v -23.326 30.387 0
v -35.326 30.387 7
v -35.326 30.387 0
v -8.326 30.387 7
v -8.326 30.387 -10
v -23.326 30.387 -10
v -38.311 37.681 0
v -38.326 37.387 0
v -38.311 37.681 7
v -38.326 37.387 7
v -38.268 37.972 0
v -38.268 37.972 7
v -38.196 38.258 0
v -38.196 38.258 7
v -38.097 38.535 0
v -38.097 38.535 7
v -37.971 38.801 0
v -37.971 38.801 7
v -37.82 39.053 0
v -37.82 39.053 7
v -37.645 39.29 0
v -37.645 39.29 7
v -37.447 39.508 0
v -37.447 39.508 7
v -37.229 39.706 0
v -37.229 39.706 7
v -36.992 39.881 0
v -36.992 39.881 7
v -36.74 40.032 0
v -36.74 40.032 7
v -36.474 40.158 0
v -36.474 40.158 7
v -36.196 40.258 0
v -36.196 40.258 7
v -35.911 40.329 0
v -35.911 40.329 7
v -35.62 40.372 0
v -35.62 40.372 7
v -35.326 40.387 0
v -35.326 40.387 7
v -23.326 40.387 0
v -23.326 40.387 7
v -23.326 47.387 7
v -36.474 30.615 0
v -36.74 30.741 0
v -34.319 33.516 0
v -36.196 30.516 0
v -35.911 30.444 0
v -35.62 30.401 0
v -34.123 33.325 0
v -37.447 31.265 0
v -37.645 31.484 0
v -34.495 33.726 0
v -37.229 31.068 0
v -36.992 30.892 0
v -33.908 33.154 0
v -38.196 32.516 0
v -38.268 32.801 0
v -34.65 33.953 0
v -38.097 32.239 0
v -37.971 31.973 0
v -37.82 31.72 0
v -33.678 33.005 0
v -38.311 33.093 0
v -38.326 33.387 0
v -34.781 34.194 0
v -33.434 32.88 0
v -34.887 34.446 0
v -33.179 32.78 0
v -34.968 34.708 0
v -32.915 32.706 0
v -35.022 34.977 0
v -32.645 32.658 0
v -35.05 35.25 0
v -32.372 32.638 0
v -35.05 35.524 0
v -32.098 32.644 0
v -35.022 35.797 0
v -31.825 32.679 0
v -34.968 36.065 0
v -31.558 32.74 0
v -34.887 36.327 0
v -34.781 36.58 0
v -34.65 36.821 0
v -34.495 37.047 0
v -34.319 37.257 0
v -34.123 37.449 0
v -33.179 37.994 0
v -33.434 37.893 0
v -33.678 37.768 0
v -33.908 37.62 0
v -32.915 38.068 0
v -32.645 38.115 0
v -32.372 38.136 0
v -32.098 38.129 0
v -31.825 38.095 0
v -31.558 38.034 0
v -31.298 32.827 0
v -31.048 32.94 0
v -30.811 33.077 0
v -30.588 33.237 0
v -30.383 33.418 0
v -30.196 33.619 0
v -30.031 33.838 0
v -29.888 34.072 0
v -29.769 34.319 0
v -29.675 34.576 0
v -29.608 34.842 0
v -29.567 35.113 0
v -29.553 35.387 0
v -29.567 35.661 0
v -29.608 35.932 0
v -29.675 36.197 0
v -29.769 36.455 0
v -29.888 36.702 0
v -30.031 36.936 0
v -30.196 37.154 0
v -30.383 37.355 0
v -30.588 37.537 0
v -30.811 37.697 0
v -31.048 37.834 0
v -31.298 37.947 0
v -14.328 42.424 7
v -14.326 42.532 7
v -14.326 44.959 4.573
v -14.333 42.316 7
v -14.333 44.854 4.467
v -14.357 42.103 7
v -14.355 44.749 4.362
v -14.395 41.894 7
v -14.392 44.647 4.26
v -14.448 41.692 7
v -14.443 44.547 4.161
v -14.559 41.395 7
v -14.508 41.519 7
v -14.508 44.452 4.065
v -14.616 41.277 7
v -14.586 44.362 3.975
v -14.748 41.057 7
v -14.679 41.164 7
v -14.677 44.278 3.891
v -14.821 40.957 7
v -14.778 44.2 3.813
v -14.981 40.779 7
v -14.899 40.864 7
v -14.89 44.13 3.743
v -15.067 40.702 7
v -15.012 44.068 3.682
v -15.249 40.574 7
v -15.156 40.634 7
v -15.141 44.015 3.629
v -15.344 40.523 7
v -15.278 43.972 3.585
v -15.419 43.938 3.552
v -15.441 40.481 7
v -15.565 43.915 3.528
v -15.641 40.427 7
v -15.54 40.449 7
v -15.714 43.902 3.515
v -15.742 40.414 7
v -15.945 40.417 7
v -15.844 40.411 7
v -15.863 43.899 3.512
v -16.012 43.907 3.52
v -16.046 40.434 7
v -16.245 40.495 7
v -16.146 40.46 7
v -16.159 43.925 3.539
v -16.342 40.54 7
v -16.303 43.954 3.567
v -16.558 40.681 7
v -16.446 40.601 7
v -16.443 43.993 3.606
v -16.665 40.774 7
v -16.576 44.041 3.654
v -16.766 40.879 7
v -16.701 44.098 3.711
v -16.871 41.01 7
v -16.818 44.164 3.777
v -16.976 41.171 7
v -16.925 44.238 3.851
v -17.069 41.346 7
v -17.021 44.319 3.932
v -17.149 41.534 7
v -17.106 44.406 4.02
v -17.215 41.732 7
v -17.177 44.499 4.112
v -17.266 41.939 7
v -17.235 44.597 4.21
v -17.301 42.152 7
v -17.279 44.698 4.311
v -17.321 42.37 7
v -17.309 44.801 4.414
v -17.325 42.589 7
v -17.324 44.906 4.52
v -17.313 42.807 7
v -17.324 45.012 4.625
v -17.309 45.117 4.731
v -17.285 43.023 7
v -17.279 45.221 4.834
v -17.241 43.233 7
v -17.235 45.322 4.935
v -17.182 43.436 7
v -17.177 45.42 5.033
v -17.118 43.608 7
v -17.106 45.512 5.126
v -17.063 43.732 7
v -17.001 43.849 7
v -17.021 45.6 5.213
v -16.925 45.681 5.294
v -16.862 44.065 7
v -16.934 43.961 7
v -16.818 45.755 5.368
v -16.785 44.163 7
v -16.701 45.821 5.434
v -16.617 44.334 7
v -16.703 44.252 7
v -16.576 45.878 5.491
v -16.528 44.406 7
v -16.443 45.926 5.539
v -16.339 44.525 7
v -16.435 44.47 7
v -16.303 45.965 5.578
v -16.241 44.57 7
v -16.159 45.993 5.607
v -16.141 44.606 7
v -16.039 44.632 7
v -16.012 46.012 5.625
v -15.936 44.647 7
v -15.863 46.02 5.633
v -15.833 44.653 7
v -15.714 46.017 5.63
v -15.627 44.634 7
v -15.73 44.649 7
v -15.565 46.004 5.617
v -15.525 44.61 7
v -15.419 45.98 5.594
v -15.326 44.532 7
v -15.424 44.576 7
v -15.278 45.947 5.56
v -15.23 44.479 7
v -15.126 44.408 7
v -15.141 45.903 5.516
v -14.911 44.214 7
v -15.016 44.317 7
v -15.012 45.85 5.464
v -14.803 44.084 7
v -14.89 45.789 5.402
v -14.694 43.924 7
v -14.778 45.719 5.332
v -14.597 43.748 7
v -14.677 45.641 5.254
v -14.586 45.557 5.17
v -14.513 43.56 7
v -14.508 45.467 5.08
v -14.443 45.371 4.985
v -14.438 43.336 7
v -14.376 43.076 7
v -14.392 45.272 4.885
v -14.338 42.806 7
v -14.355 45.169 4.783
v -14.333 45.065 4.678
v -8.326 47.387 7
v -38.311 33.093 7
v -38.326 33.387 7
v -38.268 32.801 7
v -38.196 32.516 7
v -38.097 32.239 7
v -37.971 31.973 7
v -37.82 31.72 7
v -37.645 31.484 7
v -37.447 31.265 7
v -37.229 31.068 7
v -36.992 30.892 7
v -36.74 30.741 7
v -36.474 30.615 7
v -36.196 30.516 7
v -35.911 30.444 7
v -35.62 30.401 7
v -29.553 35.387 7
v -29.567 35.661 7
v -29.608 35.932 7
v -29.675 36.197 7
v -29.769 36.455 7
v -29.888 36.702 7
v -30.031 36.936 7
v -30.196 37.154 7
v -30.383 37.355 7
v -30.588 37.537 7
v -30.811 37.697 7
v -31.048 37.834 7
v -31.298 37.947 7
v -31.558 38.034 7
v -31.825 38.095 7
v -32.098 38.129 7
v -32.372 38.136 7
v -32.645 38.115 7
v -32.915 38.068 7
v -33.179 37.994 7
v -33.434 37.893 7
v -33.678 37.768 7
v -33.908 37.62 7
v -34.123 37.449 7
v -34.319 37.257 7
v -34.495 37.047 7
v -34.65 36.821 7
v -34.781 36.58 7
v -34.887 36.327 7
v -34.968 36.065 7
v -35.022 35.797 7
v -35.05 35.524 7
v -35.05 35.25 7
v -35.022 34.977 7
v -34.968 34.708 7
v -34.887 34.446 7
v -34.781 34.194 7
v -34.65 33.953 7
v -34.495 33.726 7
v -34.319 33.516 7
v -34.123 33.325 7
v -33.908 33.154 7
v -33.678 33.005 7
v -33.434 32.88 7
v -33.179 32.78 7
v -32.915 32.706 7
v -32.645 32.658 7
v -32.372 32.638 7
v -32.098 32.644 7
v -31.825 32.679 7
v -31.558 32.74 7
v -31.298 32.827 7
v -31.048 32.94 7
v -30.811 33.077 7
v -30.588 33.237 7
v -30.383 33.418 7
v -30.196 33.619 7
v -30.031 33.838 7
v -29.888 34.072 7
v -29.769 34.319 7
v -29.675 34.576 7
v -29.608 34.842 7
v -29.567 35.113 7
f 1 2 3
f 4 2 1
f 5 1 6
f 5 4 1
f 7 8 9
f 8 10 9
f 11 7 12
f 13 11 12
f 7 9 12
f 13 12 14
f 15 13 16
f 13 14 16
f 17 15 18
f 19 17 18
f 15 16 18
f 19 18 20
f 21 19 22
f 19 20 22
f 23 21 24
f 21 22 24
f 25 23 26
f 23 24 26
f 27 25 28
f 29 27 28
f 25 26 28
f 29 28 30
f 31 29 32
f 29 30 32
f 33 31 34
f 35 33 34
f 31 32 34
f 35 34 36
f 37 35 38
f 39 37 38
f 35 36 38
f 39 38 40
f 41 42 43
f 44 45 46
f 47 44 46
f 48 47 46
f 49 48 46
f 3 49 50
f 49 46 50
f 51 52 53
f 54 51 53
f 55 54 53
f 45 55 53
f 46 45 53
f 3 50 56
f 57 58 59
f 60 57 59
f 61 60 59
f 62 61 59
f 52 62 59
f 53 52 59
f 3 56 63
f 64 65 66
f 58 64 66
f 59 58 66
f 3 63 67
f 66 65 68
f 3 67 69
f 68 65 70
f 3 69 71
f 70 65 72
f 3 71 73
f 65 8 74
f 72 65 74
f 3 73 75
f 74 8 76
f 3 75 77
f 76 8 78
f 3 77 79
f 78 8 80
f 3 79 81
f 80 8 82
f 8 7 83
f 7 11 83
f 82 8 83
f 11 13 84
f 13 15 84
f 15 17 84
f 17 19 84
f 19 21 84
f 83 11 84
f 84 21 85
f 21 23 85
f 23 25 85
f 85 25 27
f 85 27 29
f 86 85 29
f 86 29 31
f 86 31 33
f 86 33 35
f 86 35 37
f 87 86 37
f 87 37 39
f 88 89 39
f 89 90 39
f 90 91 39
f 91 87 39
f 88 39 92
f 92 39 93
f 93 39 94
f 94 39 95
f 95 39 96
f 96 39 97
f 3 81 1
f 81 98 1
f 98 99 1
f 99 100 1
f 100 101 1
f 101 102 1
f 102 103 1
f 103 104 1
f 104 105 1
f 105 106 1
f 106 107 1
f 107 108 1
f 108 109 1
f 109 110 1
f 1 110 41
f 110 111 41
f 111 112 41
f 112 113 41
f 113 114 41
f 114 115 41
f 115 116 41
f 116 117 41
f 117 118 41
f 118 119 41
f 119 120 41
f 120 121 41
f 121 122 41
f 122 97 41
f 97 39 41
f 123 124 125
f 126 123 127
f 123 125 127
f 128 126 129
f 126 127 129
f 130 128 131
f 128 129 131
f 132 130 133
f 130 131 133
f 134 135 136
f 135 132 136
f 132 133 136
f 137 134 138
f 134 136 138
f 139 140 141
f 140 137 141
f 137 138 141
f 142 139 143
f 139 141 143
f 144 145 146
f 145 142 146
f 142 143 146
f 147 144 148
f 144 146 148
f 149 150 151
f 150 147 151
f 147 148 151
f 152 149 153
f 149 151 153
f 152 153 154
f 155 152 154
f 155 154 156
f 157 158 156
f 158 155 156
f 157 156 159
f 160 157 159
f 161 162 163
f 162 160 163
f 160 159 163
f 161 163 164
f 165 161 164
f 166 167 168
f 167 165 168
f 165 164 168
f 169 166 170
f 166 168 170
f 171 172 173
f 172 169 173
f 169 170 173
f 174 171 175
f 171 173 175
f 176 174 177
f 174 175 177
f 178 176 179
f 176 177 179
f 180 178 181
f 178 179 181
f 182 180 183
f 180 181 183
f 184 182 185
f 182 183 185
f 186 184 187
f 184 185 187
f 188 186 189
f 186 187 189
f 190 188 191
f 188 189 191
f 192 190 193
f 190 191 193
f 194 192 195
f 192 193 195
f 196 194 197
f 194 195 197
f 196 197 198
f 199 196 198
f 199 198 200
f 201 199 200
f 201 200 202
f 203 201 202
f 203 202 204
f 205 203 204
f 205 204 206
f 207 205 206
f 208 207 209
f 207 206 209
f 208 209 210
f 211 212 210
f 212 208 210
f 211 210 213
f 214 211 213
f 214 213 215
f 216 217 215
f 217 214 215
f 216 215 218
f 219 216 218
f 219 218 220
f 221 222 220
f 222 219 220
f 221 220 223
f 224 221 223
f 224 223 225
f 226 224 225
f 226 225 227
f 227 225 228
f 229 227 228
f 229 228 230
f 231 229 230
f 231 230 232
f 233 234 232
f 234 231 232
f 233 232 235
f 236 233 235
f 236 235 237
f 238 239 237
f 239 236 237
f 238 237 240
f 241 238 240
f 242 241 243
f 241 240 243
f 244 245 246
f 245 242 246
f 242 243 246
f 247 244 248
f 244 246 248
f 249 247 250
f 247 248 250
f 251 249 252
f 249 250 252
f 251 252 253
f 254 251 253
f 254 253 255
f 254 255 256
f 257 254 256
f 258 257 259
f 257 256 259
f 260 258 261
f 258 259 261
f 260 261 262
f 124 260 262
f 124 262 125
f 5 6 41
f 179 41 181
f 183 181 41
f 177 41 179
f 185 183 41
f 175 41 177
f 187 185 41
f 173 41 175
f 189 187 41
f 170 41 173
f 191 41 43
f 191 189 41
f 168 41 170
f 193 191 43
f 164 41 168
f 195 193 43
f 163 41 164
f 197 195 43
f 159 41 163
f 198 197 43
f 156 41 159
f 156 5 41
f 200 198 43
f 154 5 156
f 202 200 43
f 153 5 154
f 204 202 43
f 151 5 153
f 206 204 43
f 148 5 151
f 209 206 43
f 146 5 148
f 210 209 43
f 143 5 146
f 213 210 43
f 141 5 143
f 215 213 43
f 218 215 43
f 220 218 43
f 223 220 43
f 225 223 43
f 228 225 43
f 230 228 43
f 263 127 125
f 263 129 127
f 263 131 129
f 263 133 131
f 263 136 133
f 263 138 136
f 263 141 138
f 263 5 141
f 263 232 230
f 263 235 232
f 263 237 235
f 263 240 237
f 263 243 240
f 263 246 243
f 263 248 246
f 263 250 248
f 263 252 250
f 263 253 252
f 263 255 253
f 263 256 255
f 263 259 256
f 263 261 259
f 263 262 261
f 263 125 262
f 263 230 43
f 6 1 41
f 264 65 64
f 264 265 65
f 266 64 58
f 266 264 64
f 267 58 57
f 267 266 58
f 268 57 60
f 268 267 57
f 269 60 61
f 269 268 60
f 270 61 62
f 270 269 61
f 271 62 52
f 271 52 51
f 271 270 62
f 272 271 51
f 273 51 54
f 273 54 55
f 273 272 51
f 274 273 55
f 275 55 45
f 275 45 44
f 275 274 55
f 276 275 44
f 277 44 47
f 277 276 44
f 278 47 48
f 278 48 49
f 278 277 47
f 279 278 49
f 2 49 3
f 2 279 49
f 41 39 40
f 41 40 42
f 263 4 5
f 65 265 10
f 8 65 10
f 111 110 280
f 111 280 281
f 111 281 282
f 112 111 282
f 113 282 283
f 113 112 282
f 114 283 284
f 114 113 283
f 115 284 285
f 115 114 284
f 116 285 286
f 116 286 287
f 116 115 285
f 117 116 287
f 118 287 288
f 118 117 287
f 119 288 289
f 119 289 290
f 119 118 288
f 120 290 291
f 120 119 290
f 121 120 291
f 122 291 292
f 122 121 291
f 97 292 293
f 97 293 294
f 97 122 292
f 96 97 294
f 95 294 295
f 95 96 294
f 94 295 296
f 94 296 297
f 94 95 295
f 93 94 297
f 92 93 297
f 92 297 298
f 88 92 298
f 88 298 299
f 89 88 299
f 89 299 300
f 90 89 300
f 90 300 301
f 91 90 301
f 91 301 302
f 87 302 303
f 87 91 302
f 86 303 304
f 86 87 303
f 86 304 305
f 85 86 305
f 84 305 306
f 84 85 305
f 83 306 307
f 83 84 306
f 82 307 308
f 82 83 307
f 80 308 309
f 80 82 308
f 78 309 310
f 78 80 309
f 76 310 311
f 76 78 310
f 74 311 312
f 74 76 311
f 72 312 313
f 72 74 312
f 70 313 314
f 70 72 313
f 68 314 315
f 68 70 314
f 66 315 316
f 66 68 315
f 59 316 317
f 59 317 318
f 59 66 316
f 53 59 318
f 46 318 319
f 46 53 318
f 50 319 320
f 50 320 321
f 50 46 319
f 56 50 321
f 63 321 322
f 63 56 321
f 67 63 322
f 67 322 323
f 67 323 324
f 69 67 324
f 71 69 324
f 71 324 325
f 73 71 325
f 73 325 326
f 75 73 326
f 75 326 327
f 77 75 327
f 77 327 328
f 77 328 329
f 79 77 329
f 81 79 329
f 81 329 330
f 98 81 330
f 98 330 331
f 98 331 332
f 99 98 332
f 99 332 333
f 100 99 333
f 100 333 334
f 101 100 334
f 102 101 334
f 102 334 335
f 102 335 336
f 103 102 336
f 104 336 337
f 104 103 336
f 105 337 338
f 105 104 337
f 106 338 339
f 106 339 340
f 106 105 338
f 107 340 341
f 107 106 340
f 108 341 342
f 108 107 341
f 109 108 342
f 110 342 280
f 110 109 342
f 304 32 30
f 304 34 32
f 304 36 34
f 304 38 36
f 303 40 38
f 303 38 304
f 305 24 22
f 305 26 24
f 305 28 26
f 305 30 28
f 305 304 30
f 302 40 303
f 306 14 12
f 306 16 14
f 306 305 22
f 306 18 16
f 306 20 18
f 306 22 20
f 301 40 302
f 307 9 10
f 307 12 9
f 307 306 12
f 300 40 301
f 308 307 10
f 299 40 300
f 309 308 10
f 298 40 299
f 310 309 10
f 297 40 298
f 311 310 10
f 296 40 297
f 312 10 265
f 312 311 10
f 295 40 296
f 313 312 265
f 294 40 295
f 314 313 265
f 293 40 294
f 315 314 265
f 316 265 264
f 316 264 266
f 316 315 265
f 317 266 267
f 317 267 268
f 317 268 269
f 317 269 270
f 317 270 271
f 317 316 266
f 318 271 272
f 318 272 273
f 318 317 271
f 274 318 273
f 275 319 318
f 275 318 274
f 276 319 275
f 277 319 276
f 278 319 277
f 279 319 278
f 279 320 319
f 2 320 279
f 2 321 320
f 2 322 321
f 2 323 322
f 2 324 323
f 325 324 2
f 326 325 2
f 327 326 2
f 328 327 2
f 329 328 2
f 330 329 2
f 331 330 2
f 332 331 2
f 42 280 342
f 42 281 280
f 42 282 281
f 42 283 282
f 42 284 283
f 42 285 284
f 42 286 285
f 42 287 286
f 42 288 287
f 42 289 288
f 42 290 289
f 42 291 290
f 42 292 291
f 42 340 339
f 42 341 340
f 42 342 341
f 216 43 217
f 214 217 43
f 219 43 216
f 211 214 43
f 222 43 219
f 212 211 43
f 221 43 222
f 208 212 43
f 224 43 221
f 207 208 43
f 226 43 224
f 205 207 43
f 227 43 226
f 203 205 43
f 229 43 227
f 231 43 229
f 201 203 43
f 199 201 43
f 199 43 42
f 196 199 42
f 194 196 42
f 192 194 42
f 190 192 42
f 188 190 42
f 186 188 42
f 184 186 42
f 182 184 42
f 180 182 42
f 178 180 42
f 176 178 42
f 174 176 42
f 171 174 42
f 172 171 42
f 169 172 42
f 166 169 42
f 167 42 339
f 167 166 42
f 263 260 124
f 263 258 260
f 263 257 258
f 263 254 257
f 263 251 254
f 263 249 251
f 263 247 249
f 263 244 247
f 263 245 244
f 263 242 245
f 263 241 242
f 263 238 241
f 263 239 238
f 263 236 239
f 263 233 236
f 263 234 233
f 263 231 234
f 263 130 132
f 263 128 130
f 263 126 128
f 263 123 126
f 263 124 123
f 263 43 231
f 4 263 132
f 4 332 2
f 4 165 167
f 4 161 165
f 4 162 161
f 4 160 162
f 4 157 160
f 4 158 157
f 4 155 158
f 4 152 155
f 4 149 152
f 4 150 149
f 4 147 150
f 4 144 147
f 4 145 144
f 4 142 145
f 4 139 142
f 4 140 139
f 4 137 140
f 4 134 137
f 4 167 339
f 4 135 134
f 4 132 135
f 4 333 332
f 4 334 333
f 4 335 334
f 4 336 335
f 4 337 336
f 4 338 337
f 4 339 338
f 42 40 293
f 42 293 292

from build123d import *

# Parameters (mm, degrees)
F0_W     = 30
F0_H     = 10
F0_R     = 2.75
F1_DEPTH = 7
F3_DEPTH = 15
F4_R     = 3
F5_R     = 1.5
F6_DEPTH = 25


# Not quite as in the source:
# - a feature names something its author has since deleted; it is built from what else it names


with BuildPart() as f1:
    # F0 (on Top) → F1 (new body)
    with BuildSketch(Plane.XY):
        with Locations((-23.3256115019, 35.3867347538)):
            Rectangle(F0_W, F0_H)
        with Locations((-32.3030129075, 35.3867347538)):
            Circle(F0_R, mode=Mode.SUBTRACT)
    extrude(amount=F1_DEPTH)

    # F2 (on face) → F3 (join)
    with BuildSketch(Plane.YZ.offset(-8.3256115019)):
        Polygon((30.3867347538, -10), (40.3867347538, 0), (30.3867347538, 0), align=None)
        Polygon((40.3867347538, 7), (40.3867347538, 0), (47.3867347538, 7), align=None)
    extrude(amount=-F3_DEPTH)

    # F4
    f4_edges = [f1.edges().sort_by_distance(p)[0] for p in [
        (-38.325612, 40.386735, 3.5),
        (-38.325612, 30.386735, 3.5),
    ]]
    fillet(f4_edges, radius=F4_R)

    # F5 (on face) → F6 (cut)
    with BuildSketch(Plane(origin=(0, 20.1933673769, -20.1933673769), x_dir=(1, 0, 0), z_dir=(0, 0.7071067812, -0.7071067812))):
        with Locations((-15.8256115019, -35.0243411958)):
            Circle(F5_R)
    extrude(amount=-F6_DEPTH, mode=Mode.SUBTRACT)


solid = f1.part
